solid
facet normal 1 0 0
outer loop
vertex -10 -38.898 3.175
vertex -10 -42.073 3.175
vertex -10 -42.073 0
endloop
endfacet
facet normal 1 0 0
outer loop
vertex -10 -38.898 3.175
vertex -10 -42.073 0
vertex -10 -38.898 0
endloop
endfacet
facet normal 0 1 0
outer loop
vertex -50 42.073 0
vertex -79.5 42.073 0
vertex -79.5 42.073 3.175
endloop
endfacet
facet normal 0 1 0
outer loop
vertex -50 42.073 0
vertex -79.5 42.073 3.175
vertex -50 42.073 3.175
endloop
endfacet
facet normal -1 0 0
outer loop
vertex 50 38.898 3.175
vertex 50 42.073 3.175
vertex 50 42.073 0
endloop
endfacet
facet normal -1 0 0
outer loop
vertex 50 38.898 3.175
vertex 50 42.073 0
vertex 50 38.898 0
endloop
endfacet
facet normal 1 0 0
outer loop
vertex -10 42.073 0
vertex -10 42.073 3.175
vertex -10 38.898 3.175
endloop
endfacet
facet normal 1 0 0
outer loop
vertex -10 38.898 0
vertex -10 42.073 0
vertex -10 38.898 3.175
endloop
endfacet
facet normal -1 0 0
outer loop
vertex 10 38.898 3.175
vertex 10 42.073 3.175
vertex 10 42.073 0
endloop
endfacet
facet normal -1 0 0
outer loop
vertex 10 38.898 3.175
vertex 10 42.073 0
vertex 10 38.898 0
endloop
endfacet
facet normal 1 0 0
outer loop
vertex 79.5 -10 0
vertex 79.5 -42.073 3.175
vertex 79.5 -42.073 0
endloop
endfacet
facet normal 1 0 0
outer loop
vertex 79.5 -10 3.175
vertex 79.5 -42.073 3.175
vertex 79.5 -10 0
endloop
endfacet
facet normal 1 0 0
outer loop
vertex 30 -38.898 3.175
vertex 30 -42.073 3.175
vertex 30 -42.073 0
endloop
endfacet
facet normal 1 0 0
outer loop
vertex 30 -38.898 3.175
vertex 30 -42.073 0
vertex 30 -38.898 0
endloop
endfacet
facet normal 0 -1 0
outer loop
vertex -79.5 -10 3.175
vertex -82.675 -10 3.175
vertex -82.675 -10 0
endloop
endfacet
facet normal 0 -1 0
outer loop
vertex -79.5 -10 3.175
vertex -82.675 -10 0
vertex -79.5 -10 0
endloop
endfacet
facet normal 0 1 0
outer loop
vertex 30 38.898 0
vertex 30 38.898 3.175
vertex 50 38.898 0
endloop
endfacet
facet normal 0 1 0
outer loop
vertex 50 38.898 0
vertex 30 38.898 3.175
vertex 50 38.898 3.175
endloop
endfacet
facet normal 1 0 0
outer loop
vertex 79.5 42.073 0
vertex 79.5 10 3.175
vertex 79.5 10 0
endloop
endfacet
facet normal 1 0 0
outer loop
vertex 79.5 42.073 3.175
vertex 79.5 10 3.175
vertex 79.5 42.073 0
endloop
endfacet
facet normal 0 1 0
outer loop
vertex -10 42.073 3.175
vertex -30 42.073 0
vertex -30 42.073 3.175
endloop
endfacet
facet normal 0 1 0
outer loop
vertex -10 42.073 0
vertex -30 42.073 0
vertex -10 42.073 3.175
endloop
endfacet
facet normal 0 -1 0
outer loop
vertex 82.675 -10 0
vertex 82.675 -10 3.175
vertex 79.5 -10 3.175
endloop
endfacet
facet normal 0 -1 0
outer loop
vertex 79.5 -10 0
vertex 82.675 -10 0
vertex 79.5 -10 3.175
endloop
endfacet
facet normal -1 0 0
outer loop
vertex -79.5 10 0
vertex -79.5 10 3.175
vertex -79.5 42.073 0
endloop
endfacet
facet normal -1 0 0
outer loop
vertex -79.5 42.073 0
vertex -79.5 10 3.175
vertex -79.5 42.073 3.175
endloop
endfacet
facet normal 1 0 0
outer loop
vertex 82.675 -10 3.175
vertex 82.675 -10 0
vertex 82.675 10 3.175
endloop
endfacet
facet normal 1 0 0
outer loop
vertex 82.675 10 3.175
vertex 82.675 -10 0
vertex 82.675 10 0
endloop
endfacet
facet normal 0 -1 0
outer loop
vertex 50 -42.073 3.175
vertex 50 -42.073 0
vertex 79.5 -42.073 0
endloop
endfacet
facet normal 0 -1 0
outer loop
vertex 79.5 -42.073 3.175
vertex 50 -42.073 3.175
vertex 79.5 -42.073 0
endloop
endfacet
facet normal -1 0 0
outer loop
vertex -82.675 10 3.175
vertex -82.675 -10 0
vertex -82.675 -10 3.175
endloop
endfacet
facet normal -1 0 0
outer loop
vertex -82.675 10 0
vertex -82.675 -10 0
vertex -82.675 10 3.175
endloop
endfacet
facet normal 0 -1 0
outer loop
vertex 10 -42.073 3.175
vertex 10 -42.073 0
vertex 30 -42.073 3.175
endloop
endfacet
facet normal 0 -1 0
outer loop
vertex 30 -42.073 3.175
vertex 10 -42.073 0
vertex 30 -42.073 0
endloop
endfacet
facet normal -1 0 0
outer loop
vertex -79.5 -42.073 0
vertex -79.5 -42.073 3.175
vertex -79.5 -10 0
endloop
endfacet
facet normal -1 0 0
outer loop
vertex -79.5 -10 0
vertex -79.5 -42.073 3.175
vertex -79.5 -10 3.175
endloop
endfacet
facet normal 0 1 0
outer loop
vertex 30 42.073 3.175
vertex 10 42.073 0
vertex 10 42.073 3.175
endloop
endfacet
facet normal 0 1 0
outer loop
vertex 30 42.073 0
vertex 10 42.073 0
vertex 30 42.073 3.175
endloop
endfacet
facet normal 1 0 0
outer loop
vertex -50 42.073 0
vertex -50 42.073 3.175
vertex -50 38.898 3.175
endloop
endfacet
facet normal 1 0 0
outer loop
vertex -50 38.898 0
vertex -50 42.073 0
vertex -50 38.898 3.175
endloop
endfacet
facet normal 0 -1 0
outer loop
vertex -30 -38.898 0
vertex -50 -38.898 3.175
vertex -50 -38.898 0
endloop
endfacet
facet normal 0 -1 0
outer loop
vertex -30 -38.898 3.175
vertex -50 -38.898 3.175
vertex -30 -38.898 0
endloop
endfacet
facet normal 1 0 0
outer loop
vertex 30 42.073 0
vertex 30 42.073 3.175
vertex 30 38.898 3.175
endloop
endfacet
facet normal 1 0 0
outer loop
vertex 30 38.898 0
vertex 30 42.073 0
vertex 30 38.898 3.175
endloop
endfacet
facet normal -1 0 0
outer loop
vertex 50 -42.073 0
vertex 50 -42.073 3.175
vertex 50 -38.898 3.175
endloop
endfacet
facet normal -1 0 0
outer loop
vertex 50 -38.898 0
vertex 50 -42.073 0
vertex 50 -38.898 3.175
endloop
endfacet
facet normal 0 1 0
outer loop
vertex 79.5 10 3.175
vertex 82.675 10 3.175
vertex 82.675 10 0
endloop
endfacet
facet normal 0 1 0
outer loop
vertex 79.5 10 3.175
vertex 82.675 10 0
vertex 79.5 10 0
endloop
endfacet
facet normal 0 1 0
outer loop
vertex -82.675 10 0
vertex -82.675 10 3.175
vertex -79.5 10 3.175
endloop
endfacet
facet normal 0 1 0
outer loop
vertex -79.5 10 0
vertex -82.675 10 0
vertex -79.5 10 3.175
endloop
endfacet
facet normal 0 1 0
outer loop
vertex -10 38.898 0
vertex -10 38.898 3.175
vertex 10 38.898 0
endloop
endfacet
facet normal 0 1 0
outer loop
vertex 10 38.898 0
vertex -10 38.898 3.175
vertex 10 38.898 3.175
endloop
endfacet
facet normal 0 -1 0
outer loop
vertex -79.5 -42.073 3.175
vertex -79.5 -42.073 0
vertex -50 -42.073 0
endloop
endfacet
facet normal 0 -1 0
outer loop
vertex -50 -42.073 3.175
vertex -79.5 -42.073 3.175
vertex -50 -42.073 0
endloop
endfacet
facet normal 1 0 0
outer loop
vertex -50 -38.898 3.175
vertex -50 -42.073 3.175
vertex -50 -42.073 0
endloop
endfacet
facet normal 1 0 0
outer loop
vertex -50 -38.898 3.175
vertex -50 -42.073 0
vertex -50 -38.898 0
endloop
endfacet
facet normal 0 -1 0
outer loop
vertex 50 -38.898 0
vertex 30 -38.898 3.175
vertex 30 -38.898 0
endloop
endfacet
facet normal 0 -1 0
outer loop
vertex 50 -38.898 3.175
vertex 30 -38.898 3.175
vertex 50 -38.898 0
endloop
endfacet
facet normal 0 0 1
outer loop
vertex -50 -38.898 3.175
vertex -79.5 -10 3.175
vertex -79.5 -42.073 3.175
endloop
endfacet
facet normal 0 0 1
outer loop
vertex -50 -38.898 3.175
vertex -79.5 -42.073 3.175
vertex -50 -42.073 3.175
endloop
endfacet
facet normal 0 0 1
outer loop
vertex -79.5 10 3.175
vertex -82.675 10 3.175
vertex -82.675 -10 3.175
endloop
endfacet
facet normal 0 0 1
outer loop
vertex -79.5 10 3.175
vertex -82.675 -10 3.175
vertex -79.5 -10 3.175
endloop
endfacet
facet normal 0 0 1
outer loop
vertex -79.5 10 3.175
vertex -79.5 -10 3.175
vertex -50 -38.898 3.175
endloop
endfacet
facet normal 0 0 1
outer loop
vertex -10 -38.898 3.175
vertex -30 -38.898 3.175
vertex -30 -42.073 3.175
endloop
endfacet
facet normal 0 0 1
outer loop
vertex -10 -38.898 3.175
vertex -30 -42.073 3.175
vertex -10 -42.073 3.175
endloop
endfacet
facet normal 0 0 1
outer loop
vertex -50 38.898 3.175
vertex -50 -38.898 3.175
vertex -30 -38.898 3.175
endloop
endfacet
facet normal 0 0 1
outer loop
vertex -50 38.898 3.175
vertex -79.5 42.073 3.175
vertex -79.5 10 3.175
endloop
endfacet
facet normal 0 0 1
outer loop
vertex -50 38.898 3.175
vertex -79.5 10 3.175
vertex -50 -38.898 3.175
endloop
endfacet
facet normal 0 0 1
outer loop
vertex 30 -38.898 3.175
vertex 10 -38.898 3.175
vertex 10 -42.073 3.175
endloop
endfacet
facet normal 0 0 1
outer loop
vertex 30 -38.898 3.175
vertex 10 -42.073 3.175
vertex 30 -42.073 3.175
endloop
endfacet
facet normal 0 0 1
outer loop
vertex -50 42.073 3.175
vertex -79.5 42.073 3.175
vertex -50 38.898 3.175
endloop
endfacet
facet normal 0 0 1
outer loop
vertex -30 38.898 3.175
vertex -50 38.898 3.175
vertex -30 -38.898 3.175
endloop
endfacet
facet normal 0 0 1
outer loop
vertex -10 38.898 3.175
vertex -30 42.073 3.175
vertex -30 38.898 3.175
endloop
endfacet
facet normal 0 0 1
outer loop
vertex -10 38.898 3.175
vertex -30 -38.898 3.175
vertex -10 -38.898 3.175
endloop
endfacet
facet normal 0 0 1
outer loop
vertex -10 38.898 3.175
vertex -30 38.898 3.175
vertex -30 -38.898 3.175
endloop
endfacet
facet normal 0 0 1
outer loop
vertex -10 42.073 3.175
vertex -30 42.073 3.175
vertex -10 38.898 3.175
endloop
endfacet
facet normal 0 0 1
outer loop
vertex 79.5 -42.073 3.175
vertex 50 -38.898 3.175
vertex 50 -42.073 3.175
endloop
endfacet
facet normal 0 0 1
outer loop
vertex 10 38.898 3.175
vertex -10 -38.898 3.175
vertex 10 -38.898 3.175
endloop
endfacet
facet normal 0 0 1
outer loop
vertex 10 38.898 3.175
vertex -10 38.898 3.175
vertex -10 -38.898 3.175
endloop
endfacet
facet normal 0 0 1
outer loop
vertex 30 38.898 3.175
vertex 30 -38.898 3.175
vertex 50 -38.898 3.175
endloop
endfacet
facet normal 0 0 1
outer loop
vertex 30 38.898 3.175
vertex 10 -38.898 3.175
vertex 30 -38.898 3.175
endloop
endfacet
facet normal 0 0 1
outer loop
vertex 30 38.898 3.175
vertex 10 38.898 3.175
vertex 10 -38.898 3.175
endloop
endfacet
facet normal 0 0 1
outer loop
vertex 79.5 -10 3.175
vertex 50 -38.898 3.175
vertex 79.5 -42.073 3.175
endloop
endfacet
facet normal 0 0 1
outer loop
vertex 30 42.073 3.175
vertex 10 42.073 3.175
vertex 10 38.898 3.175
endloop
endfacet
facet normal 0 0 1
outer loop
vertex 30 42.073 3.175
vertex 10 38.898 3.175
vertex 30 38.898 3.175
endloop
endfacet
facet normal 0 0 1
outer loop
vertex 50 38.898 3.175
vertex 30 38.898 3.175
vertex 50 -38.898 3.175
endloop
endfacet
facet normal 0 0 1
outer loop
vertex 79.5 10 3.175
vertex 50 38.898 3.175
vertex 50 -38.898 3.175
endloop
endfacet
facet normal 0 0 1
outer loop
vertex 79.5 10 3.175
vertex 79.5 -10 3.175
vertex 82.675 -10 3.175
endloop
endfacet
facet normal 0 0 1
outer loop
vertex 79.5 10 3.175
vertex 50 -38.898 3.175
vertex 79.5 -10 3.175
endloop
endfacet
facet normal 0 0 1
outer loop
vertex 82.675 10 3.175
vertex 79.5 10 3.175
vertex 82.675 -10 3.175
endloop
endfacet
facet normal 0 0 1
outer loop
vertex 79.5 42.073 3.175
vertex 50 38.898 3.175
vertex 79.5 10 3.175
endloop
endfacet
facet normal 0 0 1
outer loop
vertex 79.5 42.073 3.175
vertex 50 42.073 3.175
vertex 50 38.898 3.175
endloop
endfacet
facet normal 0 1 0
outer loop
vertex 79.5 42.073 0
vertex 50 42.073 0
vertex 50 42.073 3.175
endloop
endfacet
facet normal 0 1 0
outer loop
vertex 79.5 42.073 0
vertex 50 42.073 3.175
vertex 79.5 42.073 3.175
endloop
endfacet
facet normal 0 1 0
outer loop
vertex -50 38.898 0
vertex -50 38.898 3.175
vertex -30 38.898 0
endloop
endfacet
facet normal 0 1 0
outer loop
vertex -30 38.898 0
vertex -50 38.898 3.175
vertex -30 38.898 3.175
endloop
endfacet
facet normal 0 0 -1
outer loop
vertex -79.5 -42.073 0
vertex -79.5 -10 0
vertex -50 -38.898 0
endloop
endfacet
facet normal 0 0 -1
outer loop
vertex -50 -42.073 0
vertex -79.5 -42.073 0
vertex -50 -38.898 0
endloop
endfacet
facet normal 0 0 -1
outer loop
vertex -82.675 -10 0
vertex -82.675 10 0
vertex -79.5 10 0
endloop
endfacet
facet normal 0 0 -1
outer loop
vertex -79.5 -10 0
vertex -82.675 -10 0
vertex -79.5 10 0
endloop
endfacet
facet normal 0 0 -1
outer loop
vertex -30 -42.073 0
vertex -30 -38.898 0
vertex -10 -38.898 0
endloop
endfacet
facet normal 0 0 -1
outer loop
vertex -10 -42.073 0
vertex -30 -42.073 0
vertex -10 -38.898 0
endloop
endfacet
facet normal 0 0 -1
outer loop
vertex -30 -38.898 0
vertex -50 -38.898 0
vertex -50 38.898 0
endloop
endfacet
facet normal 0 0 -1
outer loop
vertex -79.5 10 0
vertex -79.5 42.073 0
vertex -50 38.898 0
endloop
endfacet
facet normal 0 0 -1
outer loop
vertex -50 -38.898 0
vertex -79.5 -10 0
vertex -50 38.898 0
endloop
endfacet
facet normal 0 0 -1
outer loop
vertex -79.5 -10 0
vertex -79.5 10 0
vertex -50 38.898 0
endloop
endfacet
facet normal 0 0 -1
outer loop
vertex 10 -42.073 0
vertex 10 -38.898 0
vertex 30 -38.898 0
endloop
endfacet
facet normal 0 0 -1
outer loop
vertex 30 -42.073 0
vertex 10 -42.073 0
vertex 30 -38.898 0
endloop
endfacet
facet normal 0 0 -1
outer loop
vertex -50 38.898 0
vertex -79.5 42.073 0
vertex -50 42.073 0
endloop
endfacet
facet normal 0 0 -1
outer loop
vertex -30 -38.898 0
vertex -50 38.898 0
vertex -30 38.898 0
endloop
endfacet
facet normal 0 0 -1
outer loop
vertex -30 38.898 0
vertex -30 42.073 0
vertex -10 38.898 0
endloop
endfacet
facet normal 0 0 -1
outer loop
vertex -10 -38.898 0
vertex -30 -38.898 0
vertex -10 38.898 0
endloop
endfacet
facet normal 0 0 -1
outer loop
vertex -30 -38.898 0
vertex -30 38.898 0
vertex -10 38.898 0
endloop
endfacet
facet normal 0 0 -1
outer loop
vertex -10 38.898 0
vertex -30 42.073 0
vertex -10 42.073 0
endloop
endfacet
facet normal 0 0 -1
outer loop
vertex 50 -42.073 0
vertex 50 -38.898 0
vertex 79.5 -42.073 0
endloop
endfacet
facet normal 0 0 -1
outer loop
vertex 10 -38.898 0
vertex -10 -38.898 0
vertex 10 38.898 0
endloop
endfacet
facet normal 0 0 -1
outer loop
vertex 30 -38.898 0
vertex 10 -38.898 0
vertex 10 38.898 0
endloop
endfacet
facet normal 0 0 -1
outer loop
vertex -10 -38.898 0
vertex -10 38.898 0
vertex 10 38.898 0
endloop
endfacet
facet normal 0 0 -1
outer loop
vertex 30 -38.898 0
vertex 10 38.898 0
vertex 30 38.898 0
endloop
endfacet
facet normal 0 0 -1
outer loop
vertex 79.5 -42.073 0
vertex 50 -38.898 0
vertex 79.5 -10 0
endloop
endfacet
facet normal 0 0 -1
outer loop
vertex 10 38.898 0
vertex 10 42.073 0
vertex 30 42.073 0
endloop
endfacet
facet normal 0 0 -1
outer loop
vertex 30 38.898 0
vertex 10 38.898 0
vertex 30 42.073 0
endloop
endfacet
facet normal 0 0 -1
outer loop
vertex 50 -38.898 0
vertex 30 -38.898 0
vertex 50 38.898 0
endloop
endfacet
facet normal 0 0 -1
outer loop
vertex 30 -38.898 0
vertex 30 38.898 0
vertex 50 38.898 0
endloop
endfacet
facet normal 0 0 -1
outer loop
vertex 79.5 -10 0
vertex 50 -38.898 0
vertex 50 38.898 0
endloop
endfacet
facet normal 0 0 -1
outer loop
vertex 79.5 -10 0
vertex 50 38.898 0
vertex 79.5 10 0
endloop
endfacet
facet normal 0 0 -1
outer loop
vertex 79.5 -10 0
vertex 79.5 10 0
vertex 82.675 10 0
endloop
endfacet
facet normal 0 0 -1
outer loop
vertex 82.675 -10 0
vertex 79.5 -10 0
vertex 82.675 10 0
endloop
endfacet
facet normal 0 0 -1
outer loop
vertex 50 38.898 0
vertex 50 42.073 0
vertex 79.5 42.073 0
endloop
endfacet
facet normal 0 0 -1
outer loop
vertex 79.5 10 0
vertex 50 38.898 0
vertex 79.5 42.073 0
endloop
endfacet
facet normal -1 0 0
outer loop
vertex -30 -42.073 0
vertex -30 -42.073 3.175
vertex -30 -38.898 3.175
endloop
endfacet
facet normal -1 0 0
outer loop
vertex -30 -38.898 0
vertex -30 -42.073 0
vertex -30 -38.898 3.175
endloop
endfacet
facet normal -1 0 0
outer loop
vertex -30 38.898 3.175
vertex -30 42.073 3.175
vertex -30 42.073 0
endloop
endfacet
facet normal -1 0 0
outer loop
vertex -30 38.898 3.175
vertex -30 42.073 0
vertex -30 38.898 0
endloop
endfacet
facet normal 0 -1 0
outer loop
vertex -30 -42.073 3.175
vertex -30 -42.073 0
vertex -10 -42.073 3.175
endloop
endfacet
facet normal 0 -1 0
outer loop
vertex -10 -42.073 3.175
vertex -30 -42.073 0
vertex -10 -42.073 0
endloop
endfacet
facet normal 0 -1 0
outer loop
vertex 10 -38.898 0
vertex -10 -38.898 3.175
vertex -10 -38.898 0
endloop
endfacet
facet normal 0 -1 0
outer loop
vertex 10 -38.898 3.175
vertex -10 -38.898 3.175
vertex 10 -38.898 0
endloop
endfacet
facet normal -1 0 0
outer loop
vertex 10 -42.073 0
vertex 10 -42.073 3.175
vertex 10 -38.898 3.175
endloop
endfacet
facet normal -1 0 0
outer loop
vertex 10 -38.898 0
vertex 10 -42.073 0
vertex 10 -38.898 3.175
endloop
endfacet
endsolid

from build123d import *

# Parameters (mm, degrees)
ESQUISSE1_W             = 165.35
ESQUISSE1_H             = 84.146
BOSS_EXTRU_1_DEPTH      = 3.175
ESQUISSE2_W             = 3.175
ESQUISSE2_H             = 32.073
ENL_V_MAT_EXTRU_1_DEPTH = 93.819036727
ESQUISSE3_W             = 20
ESQUISSE3_H             = 3.175
ENL_V_MAT_EXTRU_2_DEPTH = 93.819036727


with BuildPart() as part:
    # Esquisse1 → Boss.-Extru.1 (new body)
    with BuildSketch(Plane.XY):
        Rectangle(ESQUISSE1_W, ESQUISSE1_H)
    extrude(amount=BOSS_EXTRU_1_DEPTH)

    # Esquisse2 → Enlèv. mat.-Extru.1 (cut, through all)
    with BuildSketch(Plane.XY.offset(3.175)):
        with Locations((-81.0875, -26.0365)):
            Rectangle(ESQUISSE2_W, ESQUISSE2_H)
        with Locations((-81.0875, 26.0365)):
            Rectangle(ESQUISSE2_W, ESQUISSE2_H)
    enl_v_mat_extru_1 = extrude(amount=-ENL_V_MAT_EXTRU_1_DEPTH, mode=Mode.SUBTRACT)

    # Symétrie1: Enlèv. mat.-Extru.1 across plane
    add(enl_v_mat_extru_1.mirror(Plane(origin=(0, 0, 0), x_dir=(0, 0, 1), z_dir=(1, 0, 0))), mode=Mode.SUBTRACT)

    # Esquisse3 → Enlèv. mat.-Extru.2 (cut, through all)
    with BuildSketch(Plane.XY.offset(3.175)):
        with Locations((0, -40.4855)):
            Rectangle(ESQUISSE3_W, ESQUISSE3_H)
        with Locations((40, -40.4855)):
            Rectangle(ESQUISSE3_W, ESQUISSE3_H)
        with Locations((-40, -40.4855)):
            Rectangle(ESQUISSE3_W, ESQUISSE3_H)
    enl_v_mat_extru_2 = extrude(amount=-ENL_V_MAT_EXTRU_2_DEPTH, mode=Mode.SUBTRACT)

    # Symétrie2: Enlèv. mat.-Extru.2 across plane
    add(enl_v_mat_extru_2.mirror(Plane.ZX), mode=Mode.SUBTRACT)


solid = part.part
